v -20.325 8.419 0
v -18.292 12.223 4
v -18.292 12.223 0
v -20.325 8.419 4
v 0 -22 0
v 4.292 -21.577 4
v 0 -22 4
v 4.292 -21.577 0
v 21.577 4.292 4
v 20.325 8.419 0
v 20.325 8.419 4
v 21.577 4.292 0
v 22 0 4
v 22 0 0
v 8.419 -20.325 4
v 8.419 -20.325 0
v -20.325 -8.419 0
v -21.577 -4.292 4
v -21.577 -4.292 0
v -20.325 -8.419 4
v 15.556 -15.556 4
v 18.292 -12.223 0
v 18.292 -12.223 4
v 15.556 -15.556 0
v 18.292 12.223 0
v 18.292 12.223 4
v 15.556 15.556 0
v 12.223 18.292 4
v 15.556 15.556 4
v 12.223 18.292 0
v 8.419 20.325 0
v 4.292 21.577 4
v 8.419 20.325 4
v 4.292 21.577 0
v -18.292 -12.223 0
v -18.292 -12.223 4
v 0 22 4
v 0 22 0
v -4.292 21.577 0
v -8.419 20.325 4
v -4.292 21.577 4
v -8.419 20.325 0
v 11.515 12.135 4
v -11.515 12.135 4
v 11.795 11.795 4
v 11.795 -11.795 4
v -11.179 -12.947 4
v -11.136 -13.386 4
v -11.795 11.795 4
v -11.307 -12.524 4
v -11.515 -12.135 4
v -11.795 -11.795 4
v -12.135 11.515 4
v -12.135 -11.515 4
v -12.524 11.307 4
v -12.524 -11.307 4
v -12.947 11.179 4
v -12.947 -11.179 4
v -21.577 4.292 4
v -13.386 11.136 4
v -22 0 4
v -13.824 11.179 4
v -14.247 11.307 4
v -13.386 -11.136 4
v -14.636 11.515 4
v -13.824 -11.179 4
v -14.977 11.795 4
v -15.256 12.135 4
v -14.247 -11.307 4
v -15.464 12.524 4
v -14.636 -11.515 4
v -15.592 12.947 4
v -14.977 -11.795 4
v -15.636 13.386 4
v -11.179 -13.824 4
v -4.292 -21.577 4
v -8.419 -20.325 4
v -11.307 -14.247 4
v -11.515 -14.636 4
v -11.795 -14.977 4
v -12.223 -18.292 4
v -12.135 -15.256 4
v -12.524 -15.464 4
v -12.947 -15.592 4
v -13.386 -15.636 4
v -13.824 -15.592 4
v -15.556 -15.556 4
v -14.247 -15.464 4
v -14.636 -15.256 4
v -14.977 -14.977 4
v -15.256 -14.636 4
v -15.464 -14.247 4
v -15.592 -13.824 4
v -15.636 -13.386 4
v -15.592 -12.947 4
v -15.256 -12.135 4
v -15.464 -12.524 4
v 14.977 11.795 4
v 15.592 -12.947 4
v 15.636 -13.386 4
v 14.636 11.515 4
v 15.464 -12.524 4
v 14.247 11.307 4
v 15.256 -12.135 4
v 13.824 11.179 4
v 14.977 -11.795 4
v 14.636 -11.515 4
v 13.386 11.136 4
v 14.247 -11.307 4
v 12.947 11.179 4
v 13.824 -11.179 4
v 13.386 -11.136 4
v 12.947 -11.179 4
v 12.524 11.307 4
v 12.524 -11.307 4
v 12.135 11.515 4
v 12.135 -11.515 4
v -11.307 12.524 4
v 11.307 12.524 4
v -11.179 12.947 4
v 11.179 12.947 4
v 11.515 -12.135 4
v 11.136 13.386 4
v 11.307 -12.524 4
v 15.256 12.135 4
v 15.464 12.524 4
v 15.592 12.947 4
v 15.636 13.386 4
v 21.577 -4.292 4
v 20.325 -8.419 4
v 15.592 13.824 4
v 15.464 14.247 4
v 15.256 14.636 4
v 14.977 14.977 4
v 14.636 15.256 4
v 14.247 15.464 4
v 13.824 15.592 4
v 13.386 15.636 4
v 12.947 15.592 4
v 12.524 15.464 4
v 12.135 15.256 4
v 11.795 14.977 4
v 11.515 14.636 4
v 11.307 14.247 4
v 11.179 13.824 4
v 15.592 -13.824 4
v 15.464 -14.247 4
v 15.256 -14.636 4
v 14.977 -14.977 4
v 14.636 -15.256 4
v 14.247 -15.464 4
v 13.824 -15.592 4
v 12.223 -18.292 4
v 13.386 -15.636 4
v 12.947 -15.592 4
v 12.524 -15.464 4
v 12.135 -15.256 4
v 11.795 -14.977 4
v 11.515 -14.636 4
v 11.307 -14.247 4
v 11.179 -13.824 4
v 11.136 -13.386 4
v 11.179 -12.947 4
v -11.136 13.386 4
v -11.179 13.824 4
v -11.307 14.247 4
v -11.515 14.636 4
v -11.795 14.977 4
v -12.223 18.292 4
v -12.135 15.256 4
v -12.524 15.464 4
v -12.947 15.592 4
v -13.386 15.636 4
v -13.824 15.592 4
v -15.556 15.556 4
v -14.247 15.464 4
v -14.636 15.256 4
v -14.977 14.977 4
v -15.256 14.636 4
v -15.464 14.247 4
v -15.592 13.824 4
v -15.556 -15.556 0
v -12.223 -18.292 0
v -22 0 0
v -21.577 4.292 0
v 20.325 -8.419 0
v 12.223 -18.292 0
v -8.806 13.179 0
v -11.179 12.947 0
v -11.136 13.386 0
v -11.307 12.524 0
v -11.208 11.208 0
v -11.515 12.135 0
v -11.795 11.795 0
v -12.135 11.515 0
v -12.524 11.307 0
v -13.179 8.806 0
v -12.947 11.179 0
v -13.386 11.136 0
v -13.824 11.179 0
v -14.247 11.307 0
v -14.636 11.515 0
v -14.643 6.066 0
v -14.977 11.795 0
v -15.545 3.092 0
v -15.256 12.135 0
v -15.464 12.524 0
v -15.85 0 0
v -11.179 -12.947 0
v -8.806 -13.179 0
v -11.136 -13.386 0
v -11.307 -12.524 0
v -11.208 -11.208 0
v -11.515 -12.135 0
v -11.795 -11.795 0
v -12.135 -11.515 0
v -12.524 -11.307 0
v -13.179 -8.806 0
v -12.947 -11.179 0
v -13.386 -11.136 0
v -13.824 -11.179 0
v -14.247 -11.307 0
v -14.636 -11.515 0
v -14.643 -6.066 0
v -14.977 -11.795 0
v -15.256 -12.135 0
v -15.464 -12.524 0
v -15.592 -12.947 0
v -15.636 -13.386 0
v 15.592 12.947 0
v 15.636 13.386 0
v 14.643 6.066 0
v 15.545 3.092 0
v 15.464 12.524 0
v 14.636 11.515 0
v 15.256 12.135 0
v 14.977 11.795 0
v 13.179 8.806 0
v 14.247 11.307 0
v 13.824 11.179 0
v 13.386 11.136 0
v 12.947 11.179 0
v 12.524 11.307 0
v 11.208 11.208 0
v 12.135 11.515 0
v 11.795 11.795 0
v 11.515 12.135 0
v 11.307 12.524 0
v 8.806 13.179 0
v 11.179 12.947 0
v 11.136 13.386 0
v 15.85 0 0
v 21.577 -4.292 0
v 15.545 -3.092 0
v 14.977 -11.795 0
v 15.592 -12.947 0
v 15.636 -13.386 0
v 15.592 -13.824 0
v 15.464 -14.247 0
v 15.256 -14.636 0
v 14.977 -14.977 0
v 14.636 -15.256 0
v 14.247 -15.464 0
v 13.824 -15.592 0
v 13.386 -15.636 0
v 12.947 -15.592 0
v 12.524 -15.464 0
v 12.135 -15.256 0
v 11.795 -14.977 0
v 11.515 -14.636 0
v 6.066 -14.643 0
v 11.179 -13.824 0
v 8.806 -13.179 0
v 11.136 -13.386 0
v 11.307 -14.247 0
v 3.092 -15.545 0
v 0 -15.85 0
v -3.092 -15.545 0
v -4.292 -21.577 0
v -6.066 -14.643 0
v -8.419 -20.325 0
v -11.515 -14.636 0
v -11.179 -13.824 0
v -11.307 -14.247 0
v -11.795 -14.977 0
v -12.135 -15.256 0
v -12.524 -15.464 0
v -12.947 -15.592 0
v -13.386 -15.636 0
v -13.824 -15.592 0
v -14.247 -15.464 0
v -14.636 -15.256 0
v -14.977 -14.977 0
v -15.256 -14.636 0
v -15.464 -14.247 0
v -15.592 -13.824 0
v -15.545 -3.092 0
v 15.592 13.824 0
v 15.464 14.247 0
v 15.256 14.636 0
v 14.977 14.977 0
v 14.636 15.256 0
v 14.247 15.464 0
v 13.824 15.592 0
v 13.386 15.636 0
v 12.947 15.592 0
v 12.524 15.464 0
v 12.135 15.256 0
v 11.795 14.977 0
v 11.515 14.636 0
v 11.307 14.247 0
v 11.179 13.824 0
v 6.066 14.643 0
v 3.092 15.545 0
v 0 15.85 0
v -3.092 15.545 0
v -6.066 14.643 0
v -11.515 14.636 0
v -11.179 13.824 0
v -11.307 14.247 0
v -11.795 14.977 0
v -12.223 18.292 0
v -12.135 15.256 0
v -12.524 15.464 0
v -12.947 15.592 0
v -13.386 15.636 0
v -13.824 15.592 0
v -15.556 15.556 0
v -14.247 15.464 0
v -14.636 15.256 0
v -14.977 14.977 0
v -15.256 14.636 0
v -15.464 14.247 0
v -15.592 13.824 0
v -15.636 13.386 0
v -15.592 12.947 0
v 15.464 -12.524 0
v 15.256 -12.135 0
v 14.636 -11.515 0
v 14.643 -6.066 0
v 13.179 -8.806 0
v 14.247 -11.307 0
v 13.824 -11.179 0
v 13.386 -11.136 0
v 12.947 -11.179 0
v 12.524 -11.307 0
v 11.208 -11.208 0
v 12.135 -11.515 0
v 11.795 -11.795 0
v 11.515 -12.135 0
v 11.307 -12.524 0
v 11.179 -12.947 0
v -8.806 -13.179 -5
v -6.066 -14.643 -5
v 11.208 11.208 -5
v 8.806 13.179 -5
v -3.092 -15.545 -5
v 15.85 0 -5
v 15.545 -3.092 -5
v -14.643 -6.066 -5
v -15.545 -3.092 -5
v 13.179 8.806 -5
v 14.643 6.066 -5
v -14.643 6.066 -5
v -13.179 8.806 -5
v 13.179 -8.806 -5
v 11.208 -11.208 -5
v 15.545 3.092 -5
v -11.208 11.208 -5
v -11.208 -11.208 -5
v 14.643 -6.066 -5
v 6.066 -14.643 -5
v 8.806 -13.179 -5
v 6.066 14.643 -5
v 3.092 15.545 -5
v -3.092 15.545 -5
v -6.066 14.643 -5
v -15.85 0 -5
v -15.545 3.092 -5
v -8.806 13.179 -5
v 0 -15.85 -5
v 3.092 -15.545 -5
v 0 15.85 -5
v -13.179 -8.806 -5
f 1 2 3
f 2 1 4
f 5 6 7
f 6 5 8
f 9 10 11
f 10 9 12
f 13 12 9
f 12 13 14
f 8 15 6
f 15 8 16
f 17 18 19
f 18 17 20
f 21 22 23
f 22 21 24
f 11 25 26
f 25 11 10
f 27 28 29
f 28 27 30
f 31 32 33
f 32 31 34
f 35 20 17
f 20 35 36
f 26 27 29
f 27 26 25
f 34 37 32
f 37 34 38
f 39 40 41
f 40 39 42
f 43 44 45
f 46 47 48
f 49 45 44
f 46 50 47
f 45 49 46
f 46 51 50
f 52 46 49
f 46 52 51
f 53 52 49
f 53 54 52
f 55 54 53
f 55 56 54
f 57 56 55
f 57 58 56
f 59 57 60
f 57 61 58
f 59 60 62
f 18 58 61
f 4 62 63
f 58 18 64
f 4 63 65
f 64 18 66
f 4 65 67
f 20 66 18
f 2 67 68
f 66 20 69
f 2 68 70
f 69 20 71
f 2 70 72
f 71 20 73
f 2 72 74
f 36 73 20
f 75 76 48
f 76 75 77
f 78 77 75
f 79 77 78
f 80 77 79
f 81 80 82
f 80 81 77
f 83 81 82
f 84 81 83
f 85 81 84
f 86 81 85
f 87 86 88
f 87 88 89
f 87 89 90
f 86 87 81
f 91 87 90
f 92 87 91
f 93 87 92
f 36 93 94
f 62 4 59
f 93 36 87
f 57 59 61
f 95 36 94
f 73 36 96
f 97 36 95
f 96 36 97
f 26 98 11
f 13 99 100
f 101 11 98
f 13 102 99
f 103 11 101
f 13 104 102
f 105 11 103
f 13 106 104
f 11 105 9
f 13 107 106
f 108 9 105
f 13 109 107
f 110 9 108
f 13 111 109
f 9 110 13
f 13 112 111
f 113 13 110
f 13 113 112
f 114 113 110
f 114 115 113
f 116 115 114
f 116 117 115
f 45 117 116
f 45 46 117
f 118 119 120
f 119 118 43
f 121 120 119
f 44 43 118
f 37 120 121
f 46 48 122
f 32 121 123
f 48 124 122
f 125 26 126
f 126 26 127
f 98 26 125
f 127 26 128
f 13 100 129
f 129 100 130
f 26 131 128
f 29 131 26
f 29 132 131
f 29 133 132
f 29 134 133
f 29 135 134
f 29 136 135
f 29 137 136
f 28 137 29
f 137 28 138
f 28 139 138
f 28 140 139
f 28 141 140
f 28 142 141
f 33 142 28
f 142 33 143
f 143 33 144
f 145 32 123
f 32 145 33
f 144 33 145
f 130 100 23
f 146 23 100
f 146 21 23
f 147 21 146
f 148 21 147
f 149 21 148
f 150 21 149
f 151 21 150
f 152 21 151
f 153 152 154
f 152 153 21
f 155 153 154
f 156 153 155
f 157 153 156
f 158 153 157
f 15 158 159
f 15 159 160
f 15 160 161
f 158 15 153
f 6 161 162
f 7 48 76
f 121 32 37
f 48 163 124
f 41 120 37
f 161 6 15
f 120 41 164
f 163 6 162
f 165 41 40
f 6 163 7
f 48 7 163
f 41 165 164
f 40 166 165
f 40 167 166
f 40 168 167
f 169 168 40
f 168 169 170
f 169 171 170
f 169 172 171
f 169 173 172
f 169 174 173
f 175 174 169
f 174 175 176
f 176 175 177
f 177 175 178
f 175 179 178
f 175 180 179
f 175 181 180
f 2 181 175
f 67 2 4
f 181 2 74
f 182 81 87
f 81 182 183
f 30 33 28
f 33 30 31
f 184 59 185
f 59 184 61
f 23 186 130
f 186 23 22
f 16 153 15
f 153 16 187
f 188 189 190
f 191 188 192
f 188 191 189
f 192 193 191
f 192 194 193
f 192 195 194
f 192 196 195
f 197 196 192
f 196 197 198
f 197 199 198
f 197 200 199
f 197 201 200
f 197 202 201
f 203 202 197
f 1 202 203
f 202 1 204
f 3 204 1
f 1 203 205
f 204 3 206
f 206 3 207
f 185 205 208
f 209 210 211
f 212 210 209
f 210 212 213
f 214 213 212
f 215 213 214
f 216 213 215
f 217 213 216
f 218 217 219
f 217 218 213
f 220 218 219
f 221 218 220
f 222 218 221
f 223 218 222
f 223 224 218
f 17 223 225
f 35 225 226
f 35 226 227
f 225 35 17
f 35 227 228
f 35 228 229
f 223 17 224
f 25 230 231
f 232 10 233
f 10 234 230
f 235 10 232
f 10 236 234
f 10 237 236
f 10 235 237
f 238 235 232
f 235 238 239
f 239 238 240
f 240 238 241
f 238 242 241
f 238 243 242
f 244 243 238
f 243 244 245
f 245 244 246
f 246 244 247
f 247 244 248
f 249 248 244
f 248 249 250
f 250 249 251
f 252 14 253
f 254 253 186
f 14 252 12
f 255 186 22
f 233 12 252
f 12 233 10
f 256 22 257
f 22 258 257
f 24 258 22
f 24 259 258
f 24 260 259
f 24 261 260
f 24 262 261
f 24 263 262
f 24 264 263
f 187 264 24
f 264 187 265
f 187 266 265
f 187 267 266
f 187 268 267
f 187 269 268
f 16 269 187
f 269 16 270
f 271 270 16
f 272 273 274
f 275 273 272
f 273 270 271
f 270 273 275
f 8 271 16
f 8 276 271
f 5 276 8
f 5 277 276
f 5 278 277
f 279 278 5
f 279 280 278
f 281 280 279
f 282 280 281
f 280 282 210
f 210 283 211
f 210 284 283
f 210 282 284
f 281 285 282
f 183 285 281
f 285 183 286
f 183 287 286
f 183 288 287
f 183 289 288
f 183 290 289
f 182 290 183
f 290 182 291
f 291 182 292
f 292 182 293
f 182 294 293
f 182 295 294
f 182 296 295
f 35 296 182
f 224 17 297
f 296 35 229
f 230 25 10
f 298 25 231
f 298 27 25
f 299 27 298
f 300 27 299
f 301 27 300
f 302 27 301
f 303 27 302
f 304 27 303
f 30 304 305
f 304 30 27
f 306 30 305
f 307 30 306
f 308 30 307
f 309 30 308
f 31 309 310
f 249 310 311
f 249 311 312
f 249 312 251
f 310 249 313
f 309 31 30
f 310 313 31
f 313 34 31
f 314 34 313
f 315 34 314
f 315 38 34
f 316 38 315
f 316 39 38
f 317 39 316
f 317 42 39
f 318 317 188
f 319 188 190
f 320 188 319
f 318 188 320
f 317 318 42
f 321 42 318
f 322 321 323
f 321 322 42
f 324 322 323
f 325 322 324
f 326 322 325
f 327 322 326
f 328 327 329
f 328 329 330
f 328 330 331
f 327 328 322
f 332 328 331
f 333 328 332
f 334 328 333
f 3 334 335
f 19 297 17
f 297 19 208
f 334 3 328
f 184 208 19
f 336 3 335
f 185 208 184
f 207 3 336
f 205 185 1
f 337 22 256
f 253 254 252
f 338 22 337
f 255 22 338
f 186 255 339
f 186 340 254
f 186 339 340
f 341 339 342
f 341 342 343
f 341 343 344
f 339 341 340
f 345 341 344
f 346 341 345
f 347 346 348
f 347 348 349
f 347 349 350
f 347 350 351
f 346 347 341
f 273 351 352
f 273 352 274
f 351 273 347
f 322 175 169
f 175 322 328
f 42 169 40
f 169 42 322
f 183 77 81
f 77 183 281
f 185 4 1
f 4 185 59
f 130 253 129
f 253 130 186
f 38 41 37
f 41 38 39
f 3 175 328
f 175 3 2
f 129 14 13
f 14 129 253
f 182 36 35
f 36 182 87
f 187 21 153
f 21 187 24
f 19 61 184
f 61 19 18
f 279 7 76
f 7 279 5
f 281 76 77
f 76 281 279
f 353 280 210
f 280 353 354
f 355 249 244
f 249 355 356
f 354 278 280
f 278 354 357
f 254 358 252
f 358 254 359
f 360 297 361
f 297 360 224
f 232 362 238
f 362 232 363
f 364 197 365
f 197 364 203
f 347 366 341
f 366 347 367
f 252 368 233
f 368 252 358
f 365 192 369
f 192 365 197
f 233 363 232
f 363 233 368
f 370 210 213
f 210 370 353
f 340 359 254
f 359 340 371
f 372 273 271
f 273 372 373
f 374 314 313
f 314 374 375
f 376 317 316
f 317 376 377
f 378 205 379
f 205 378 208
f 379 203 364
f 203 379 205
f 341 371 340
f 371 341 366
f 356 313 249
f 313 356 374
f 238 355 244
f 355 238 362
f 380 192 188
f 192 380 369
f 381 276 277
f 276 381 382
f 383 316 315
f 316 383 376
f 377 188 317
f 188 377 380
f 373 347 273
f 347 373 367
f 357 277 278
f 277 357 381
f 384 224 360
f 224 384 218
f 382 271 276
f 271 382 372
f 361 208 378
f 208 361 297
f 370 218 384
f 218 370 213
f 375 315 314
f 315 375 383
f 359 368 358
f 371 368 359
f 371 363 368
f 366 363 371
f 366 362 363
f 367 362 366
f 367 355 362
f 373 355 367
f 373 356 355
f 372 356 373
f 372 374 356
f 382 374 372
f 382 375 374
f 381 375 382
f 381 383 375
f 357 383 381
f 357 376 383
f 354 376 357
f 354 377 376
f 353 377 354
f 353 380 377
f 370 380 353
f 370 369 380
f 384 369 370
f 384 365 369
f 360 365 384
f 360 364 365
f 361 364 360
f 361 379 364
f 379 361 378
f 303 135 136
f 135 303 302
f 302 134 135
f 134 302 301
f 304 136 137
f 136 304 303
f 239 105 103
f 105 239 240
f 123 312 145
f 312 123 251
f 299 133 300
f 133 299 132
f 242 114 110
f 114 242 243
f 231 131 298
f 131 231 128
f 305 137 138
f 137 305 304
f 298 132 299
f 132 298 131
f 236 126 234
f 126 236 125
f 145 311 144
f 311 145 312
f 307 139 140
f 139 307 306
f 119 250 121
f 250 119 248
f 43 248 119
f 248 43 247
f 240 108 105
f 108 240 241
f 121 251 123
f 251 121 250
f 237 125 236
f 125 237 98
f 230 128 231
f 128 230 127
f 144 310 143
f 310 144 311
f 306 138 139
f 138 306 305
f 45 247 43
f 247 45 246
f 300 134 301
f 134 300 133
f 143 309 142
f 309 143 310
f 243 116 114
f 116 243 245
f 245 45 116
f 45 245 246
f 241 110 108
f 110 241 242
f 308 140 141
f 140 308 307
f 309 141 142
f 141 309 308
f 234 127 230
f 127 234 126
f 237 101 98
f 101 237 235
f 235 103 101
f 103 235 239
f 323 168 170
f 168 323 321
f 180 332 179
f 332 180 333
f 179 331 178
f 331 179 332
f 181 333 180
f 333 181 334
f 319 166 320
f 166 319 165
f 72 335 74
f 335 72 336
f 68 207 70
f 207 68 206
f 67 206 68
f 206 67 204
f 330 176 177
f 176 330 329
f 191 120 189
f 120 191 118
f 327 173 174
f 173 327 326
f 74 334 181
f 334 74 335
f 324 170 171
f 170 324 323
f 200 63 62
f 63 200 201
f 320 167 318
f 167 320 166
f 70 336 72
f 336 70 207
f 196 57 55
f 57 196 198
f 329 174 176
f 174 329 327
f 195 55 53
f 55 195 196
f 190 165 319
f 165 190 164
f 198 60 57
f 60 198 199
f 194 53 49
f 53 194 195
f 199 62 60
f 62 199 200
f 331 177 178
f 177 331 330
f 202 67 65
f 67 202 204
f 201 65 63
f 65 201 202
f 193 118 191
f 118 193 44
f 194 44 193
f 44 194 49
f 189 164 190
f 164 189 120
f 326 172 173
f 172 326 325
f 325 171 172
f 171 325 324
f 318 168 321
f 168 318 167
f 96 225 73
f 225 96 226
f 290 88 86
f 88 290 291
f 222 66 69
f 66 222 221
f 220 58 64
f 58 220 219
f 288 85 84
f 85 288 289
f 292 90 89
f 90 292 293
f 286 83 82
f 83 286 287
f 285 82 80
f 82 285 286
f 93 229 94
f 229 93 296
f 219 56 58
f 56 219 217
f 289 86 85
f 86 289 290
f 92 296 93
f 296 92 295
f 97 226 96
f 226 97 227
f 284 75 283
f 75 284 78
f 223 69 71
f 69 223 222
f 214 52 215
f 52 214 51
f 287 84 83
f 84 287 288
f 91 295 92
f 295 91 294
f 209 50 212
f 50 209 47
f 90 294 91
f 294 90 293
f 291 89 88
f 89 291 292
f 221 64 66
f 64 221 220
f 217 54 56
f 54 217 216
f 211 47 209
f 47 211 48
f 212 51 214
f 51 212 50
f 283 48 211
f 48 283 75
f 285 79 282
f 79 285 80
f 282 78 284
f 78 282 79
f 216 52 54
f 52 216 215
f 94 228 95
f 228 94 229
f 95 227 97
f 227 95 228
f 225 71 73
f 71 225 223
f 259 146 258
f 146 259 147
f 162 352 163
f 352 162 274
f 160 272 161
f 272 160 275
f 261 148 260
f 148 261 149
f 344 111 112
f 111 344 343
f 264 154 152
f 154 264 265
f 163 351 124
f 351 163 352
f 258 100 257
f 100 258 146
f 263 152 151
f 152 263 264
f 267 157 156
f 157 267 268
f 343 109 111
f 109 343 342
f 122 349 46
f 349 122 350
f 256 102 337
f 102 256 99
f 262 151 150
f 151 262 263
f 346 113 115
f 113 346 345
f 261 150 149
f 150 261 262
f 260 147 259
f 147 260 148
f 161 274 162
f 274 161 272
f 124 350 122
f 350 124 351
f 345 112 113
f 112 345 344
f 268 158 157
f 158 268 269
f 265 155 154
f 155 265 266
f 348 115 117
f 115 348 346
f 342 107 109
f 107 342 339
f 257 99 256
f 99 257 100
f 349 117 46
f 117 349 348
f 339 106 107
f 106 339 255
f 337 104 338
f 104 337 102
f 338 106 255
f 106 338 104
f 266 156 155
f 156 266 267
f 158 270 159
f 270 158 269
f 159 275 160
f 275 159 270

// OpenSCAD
$fn = 32;

// ----------------------------------------------------------------------
// Retaining cap: 6002 cover, 44 mm, spigot 31.7 mm
// ----------------------------------------------------------------------

// --- parameters (mm) ---
cap_d = 44;               // cover diameter
cap_t = 4;                // cover thickness
lip_d = 31.7;             // spigot that enters the housing
lip_h = 5;                // spigot height
bolt_d = 4.5;             // bolt clearance
bolt_r = 18.93;           // bolt circle radius

module cover() {
  cylinder(h = cap_t, d = cap_d);
}

module spigot() {
  /* sunk 1 mm into the cover; the spigot sets the overall height */
  translate([0, 0, -lip_h]) cylinder(h = lip_h + 1, d = lip_d);
}

difference() {
  union() {
    cover();
    spigot();
  }
  for (i = [0 : 3]) rotate([0, 0, 45 + i * 90]) translate([bolt_r, 0, -lip_h - 1])
    cylinder(h = lip_h + cap_t + 2, d = bolt_d);
}
